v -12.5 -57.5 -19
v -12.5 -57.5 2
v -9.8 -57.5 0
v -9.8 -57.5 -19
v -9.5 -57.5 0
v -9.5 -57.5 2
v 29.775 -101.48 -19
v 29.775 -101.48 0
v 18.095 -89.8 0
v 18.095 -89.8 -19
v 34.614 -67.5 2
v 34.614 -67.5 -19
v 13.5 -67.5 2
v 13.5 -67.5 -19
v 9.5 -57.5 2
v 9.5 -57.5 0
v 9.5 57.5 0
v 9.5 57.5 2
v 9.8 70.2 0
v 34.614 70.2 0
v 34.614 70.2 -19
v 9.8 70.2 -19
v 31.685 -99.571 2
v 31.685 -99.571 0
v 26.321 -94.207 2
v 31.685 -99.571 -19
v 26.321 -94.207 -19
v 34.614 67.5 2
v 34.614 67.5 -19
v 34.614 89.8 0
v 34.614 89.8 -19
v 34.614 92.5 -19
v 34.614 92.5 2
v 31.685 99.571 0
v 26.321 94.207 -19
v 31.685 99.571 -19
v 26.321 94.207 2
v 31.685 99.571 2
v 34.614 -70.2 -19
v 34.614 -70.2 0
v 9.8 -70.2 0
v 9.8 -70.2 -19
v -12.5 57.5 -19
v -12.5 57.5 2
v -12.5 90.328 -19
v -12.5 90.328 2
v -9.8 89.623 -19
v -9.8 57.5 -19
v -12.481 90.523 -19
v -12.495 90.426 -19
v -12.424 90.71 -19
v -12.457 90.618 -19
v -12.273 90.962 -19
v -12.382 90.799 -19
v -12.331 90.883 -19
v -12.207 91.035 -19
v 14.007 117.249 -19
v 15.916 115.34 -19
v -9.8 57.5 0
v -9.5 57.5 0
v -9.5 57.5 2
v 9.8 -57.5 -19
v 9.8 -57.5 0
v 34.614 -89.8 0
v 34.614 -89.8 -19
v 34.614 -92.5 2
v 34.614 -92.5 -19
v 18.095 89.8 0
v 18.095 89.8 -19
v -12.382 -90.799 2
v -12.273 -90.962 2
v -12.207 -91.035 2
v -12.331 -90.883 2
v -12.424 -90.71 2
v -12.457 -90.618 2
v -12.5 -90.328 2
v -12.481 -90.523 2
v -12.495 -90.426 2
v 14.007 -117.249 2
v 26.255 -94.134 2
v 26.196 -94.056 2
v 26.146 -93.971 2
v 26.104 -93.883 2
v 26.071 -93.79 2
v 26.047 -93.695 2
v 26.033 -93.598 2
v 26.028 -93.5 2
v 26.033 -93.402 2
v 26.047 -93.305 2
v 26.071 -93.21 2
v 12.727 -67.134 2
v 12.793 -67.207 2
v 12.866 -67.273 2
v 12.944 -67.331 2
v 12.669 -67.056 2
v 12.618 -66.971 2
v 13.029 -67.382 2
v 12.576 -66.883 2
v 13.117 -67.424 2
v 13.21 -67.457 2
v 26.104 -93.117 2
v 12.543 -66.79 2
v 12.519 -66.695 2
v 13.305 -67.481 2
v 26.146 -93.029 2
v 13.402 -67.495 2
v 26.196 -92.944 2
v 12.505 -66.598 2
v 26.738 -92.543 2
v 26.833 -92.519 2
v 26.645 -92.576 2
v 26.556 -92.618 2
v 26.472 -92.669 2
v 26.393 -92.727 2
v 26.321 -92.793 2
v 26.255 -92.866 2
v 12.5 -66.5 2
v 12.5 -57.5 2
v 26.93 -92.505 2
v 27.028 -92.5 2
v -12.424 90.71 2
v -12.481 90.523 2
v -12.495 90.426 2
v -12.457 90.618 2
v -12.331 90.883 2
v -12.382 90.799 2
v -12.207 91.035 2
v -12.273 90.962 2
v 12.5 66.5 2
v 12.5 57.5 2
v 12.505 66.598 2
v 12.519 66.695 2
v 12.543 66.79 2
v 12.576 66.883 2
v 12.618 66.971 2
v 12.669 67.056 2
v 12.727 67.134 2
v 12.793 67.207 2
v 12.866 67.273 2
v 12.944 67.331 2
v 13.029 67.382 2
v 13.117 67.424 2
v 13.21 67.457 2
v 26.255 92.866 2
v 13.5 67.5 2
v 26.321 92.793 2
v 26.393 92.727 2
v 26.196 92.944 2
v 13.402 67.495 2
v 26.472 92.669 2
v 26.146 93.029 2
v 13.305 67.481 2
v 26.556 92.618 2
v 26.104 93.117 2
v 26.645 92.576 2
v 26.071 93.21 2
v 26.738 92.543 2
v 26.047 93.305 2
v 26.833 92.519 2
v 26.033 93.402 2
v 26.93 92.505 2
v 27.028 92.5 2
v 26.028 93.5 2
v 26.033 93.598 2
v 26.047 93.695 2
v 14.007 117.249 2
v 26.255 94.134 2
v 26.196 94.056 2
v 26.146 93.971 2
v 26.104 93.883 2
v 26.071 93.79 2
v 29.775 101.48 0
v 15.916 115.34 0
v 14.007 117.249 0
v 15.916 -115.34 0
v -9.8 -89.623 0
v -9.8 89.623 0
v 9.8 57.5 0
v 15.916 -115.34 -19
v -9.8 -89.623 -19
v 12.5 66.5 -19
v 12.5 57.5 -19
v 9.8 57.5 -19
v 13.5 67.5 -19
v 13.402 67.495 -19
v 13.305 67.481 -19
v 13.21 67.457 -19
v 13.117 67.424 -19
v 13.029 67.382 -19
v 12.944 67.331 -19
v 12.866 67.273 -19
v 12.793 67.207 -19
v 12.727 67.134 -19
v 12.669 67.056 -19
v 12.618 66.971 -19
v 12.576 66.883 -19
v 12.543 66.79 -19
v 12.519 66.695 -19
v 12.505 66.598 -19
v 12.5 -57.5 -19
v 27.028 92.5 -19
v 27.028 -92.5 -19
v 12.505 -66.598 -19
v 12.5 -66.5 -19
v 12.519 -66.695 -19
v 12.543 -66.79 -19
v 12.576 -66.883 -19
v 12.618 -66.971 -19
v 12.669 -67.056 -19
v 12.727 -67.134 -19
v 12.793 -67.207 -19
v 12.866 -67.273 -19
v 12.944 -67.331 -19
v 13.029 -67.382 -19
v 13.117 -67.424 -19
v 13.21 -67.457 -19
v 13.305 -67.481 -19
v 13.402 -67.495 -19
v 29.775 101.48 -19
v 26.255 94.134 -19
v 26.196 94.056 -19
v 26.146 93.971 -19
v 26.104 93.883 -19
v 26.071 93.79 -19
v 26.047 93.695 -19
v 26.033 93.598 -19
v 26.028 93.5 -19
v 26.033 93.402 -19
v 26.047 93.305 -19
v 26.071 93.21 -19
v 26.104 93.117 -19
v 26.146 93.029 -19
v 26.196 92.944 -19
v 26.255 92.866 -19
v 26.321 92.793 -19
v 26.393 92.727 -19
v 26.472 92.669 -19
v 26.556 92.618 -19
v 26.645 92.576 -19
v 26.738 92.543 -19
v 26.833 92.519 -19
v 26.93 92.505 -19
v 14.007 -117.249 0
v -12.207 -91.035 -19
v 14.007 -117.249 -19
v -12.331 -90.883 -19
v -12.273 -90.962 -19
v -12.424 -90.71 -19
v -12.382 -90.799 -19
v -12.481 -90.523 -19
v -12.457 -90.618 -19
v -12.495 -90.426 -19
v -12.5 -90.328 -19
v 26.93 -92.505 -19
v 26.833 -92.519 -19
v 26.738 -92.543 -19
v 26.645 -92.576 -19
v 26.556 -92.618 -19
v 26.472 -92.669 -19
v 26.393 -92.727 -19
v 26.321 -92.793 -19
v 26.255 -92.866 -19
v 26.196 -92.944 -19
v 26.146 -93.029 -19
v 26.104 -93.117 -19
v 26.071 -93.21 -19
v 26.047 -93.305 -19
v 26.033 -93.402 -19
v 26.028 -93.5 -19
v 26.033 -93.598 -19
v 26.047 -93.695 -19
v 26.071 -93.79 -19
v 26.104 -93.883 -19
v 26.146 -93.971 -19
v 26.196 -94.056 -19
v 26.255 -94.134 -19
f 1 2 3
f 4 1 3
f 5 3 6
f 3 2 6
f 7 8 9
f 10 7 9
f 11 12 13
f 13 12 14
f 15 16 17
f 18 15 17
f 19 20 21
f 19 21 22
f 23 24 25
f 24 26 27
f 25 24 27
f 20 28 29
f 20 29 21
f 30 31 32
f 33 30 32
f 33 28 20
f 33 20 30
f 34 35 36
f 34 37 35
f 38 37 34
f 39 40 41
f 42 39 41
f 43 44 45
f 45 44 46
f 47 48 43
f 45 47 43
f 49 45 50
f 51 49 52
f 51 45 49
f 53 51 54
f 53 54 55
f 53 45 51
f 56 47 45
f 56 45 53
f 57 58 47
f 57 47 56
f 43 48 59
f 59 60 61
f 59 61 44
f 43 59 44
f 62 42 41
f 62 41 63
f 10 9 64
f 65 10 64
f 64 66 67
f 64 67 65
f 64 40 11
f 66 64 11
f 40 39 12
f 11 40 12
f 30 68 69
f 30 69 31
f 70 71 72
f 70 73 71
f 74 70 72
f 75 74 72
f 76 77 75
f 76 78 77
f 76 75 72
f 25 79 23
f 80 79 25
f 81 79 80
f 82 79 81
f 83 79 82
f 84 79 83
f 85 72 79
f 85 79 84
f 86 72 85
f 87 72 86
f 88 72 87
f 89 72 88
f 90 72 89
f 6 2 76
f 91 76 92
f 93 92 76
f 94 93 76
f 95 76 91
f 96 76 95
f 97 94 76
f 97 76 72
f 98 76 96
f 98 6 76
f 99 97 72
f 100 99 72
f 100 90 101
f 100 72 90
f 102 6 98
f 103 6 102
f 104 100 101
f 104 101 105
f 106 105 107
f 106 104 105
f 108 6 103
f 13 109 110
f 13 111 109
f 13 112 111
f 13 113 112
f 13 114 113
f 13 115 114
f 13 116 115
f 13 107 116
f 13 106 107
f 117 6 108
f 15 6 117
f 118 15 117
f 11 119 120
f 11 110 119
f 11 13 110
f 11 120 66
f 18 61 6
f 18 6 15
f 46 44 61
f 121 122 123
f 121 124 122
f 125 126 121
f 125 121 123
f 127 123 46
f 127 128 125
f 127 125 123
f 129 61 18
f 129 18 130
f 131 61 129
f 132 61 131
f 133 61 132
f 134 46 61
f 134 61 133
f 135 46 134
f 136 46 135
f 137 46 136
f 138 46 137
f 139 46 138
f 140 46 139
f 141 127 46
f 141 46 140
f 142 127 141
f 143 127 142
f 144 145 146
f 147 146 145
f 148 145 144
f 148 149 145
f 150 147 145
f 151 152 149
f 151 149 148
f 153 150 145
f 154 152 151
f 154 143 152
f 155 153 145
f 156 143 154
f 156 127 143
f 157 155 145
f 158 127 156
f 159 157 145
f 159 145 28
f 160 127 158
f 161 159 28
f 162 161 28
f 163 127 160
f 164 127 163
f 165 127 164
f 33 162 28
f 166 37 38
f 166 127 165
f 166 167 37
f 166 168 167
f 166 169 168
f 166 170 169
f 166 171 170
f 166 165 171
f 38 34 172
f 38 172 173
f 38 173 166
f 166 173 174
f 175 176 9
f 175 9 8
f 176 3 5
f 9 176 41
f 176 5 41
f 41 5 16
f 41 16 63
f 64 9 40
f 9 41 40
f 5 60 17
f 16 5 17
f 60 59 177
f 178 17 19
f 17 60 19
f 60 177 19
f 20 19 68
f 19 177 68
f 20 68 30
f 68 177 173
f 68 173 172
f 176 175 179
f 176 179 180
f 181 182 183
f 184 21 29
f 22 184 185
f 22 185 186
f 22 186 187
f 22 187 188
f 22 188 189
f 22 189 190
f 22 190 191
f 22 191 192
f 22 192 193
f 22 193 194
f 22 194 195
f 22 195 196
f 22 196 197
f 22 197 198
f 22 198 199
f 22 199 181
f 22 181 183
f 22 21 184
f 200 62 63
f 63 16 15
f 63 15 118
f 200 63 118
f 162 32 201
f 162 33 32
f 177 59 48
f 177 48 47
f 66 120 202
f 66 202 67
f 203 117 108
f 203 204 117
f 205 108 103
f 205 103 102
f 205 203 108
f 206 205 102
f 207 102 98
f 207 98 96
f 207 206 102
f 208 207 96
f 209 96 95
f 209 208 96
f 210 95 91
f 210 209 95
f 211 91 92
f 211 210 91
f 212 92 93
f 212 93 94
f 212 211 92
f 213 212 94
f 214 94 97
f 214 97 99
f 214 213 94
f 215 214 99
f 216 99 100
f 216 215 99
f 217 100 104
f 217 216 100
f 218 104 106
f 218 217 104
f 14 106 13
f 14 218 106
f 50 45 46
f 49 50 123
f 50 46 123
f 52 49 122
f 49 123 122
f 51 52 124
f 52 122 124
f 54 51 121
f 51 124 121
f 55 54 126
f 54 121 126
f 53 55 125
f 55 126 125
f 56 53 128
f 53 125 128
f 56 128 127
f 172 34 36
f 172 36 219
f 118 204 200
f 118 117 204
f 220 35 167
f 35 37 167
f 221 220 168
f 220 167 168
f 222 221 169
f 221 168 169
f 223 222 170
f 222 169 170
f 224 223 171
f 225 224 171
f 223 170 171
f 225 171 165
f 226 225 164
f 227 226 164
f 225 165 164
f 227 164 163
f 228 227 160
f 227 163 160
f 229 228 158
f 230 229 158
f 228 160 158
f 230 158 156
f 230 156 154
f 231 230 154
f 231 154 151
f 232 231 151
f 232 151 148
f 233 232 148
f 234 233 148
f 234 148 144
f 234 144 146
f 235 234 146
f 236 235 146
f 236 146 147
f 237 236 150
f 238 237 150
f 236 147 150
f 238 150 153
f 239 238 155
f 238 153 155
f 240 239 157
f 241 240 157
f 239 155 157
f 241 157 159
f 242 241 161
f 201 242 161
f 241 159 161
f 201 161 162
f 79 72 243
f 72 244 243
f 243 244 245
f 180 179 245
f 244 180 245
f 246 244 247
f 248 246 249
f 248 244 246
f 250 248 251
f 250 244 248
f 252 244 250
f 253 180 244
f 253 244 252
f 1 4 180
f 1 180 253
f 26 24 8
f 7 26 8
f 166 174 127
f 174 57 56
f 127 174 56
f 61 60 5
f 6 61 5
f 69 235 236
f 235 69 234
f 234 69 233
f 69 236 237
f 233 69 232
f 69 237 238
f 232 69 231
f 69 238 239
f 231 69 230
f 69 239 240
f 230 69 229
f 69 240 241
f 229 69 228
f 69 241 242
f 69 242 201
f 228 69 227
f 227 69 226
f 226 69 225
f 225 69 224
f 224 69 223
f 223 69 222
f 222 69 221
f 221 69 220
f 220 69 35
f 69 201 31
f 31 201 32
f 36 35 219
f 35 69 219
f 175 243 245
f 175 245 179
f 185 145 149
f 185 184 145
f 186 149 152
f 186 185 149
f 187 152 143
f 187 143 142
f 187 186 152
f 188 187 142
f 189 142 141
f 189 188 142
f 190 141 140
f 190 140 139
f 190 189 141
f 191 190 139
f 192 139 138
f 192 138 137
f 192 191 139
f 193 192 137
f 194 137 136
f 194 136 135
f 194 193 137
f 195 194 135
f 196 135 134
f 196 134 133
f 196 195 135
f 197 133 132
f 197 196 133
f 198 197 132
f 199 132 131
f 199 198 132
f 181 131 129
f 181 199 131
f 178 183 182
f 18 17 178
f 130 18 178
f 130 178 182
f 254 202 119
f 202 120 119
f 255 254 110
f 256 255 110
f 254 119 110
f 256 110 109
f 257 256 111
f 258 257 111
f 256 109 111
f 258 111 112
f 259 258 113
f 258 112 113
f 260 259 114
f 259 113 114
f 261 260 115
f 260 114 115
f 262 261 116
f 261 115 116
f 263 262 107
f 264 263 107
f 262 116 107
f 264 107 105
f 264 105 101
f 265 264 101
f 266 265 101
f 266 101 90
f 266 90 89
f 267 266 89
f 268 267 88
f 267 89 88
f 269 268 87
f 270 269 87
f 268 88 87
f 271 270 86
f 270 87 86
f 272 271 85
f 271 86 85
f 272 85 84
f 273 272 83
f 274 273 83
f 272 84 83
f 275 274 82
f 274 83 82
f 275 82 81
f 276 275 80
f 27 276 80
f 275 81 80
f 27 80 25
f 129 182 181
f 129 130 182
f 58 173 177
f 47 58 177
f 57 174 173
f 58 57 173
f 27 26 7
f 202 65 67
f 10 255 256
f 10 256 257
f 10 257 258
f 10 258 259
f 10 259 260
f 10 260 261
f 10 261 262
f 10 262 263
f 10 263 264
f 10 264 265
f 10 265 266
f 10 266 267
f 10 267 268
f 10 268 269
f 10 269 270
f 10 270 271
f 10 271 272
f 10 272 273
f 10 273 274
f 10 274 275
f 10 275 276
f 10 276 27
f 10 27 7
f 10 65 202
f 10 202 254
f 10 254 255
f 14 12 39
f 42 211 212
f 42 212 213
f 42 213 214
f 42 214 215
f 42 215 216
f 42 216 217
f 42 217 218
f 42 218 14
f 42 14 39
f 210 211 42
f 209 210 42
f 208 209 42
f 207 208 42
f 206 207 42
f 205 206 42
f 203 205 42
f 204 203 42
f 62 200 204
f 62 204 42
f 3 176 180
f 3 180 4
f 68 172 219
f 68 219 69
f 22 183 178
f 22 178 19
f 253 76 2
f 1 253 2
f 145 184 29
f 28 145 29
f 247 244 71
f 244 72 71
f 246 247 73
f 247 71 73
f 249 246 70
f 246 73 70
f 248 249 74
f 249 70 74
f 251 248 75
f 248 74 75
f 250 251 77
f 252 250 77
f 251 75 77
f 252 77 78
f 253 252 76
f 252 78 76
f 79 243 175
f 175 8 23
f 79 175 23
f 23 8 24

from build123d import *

# Parameters (mm, degrees)
BOSS_EXTRUDE1_DEPTH = 2
SKETCH2_W           = 24.813601178
SKETCH2_H           = 2.7
BOSS_EXTRUDE2_DEPTH = 19
SKETCH3_W           = 25
SKETCH3_H           = 10
BOSS_EXTRUDE3_DEPTH = 2
SKETCH4_W           = 2.7
SKETCH4_H           = 10
BOSS_EXTRUDE4_DEPTH = 19
FILLET1_R           = 1


with BuildPart() as part:
    # Sketch1 → Boss-Extrude1 (new body)
    with BuildSketch(Plane.XY):
        Polygon((-9.5, -67.5), (-12.5, -67.5), (-12.5, -90.741737881), (14.006999461, -117.248737342), (31.68466899, -99.571067812), (24.613601178, -92.5), (34.613601178, -92.5), (34.613601178, -67.5), (9.5, -67.5), (9.5, 67.5), (34.613601178, 67.5), (34.613601178, 92.5), (24.613601178, 92.5), (31.68466899, 99.571067812), (14.006999461, 117.248737342), (-12.5, 90.741737881), (-12.5, 67.5), (-9.5, 67.5), align=None)
    extrude(amount=BOSS_EXTRUDE1_DEPTH)

    # Sketch2 → Boss-Extrude2 (add)
    with BuildSketch(Plane(origin=(0, 0, 0), x_dir=(-1, 0, 0), z_dir=(0, 0, -1))):
        Polygon((-34.613601178, 89.8), (-34.613601178, 92.5), (-24.613601178, 92.5), (-31.68466899, 99.571067812), (-29.775480681, 101.480256121), (-18.09522456, 89.8), align=None)
        with Locations((-22.206800589, 68.85)):
            Rectangle(SKETCH2_W, SKETCH2_H)
        Polygon((9.8, 67.5), (12.5, 67.5), (12.5, 90.741737881), (-14.006999461, 117.248737342), (-15.91618777, 115.339549032), (9.8, 89.623361262), align=None)
        Polygon((-31.68466899, -99.571067812), (-29.775480681, -101.480256121), (-18.09522456, -89.8), (-34.613601178, -89.8), (-34.613601178, -92.5), (-24.613601178, -92.5), align=None)
        with Locations((-22.206800589, -68.85)):
            Rectangle(SKETCH2_W, SKETCH2_H)
        Polygon((-14.006999461, -117.248737342), (-15.91618777, -115.339549032), (9.8, -89.623361262), (9.8, -67.5), (12.5, -67.5), (12.5, -90.741737881), align=None)
    extrude(amount=BOSS_EXTRUDE2_DEPTH)

    # Sketch3 → Boss-Extrude3 (add)
    with BuildSketch(Plane.XY.offset(2)):
        with Locations((0, -62.5)):
            Rectangle(SKETCH3_W, SKETCH3_H)
        with Locations((0, 62.5)):
            Rectangle(SKETCH3_W, SKETCH3_H)
    extrude(amount=-BOSS_EXTRUDE3_DEPTH)

    # Sketch4 → Boss-Extrude4 (add)
    with BuildSketch(Plane(origin=(0, 0, 0), x_dir=(-1, 0, 0), z_dir=(0, 0, -1))):
        with Locations((11.15, 62.5)):
            Rectangle(SKETCH4_W, SKETCH4_H)
        with Locations((-11.15, 62.5)):
            Rectangle(SKETCH4_W, SKETCH4_H)
        with Locations((11.15, -62.5)):
            Rectangle(SKETCH4_W, SKETCH4_H)
        with Locations((-11.15, -62.5)):
            Rectangle(SKETCH4_W, SKETCH4_H)
    extrude(amount=BOSS_EXTRUDE4_DEPTH)

    # Fillet1
    fillet1_edges = [part.edges().sort_by_distance(p)[0] for p in [
        (12.5, -67.5, -8.5),
        (12.5, 67.5, -8.5),
        (-12.5, 90.741737881, -8.5),
        (24.613601178, 92.5, -8.5),
        (24.613601178, -92.5, -8.5),
        (-12.5, -90.741737881, -8.5),
    ]]
    fillet(fillet1_edges, radius=FILLET1_R)


solid = part.part
